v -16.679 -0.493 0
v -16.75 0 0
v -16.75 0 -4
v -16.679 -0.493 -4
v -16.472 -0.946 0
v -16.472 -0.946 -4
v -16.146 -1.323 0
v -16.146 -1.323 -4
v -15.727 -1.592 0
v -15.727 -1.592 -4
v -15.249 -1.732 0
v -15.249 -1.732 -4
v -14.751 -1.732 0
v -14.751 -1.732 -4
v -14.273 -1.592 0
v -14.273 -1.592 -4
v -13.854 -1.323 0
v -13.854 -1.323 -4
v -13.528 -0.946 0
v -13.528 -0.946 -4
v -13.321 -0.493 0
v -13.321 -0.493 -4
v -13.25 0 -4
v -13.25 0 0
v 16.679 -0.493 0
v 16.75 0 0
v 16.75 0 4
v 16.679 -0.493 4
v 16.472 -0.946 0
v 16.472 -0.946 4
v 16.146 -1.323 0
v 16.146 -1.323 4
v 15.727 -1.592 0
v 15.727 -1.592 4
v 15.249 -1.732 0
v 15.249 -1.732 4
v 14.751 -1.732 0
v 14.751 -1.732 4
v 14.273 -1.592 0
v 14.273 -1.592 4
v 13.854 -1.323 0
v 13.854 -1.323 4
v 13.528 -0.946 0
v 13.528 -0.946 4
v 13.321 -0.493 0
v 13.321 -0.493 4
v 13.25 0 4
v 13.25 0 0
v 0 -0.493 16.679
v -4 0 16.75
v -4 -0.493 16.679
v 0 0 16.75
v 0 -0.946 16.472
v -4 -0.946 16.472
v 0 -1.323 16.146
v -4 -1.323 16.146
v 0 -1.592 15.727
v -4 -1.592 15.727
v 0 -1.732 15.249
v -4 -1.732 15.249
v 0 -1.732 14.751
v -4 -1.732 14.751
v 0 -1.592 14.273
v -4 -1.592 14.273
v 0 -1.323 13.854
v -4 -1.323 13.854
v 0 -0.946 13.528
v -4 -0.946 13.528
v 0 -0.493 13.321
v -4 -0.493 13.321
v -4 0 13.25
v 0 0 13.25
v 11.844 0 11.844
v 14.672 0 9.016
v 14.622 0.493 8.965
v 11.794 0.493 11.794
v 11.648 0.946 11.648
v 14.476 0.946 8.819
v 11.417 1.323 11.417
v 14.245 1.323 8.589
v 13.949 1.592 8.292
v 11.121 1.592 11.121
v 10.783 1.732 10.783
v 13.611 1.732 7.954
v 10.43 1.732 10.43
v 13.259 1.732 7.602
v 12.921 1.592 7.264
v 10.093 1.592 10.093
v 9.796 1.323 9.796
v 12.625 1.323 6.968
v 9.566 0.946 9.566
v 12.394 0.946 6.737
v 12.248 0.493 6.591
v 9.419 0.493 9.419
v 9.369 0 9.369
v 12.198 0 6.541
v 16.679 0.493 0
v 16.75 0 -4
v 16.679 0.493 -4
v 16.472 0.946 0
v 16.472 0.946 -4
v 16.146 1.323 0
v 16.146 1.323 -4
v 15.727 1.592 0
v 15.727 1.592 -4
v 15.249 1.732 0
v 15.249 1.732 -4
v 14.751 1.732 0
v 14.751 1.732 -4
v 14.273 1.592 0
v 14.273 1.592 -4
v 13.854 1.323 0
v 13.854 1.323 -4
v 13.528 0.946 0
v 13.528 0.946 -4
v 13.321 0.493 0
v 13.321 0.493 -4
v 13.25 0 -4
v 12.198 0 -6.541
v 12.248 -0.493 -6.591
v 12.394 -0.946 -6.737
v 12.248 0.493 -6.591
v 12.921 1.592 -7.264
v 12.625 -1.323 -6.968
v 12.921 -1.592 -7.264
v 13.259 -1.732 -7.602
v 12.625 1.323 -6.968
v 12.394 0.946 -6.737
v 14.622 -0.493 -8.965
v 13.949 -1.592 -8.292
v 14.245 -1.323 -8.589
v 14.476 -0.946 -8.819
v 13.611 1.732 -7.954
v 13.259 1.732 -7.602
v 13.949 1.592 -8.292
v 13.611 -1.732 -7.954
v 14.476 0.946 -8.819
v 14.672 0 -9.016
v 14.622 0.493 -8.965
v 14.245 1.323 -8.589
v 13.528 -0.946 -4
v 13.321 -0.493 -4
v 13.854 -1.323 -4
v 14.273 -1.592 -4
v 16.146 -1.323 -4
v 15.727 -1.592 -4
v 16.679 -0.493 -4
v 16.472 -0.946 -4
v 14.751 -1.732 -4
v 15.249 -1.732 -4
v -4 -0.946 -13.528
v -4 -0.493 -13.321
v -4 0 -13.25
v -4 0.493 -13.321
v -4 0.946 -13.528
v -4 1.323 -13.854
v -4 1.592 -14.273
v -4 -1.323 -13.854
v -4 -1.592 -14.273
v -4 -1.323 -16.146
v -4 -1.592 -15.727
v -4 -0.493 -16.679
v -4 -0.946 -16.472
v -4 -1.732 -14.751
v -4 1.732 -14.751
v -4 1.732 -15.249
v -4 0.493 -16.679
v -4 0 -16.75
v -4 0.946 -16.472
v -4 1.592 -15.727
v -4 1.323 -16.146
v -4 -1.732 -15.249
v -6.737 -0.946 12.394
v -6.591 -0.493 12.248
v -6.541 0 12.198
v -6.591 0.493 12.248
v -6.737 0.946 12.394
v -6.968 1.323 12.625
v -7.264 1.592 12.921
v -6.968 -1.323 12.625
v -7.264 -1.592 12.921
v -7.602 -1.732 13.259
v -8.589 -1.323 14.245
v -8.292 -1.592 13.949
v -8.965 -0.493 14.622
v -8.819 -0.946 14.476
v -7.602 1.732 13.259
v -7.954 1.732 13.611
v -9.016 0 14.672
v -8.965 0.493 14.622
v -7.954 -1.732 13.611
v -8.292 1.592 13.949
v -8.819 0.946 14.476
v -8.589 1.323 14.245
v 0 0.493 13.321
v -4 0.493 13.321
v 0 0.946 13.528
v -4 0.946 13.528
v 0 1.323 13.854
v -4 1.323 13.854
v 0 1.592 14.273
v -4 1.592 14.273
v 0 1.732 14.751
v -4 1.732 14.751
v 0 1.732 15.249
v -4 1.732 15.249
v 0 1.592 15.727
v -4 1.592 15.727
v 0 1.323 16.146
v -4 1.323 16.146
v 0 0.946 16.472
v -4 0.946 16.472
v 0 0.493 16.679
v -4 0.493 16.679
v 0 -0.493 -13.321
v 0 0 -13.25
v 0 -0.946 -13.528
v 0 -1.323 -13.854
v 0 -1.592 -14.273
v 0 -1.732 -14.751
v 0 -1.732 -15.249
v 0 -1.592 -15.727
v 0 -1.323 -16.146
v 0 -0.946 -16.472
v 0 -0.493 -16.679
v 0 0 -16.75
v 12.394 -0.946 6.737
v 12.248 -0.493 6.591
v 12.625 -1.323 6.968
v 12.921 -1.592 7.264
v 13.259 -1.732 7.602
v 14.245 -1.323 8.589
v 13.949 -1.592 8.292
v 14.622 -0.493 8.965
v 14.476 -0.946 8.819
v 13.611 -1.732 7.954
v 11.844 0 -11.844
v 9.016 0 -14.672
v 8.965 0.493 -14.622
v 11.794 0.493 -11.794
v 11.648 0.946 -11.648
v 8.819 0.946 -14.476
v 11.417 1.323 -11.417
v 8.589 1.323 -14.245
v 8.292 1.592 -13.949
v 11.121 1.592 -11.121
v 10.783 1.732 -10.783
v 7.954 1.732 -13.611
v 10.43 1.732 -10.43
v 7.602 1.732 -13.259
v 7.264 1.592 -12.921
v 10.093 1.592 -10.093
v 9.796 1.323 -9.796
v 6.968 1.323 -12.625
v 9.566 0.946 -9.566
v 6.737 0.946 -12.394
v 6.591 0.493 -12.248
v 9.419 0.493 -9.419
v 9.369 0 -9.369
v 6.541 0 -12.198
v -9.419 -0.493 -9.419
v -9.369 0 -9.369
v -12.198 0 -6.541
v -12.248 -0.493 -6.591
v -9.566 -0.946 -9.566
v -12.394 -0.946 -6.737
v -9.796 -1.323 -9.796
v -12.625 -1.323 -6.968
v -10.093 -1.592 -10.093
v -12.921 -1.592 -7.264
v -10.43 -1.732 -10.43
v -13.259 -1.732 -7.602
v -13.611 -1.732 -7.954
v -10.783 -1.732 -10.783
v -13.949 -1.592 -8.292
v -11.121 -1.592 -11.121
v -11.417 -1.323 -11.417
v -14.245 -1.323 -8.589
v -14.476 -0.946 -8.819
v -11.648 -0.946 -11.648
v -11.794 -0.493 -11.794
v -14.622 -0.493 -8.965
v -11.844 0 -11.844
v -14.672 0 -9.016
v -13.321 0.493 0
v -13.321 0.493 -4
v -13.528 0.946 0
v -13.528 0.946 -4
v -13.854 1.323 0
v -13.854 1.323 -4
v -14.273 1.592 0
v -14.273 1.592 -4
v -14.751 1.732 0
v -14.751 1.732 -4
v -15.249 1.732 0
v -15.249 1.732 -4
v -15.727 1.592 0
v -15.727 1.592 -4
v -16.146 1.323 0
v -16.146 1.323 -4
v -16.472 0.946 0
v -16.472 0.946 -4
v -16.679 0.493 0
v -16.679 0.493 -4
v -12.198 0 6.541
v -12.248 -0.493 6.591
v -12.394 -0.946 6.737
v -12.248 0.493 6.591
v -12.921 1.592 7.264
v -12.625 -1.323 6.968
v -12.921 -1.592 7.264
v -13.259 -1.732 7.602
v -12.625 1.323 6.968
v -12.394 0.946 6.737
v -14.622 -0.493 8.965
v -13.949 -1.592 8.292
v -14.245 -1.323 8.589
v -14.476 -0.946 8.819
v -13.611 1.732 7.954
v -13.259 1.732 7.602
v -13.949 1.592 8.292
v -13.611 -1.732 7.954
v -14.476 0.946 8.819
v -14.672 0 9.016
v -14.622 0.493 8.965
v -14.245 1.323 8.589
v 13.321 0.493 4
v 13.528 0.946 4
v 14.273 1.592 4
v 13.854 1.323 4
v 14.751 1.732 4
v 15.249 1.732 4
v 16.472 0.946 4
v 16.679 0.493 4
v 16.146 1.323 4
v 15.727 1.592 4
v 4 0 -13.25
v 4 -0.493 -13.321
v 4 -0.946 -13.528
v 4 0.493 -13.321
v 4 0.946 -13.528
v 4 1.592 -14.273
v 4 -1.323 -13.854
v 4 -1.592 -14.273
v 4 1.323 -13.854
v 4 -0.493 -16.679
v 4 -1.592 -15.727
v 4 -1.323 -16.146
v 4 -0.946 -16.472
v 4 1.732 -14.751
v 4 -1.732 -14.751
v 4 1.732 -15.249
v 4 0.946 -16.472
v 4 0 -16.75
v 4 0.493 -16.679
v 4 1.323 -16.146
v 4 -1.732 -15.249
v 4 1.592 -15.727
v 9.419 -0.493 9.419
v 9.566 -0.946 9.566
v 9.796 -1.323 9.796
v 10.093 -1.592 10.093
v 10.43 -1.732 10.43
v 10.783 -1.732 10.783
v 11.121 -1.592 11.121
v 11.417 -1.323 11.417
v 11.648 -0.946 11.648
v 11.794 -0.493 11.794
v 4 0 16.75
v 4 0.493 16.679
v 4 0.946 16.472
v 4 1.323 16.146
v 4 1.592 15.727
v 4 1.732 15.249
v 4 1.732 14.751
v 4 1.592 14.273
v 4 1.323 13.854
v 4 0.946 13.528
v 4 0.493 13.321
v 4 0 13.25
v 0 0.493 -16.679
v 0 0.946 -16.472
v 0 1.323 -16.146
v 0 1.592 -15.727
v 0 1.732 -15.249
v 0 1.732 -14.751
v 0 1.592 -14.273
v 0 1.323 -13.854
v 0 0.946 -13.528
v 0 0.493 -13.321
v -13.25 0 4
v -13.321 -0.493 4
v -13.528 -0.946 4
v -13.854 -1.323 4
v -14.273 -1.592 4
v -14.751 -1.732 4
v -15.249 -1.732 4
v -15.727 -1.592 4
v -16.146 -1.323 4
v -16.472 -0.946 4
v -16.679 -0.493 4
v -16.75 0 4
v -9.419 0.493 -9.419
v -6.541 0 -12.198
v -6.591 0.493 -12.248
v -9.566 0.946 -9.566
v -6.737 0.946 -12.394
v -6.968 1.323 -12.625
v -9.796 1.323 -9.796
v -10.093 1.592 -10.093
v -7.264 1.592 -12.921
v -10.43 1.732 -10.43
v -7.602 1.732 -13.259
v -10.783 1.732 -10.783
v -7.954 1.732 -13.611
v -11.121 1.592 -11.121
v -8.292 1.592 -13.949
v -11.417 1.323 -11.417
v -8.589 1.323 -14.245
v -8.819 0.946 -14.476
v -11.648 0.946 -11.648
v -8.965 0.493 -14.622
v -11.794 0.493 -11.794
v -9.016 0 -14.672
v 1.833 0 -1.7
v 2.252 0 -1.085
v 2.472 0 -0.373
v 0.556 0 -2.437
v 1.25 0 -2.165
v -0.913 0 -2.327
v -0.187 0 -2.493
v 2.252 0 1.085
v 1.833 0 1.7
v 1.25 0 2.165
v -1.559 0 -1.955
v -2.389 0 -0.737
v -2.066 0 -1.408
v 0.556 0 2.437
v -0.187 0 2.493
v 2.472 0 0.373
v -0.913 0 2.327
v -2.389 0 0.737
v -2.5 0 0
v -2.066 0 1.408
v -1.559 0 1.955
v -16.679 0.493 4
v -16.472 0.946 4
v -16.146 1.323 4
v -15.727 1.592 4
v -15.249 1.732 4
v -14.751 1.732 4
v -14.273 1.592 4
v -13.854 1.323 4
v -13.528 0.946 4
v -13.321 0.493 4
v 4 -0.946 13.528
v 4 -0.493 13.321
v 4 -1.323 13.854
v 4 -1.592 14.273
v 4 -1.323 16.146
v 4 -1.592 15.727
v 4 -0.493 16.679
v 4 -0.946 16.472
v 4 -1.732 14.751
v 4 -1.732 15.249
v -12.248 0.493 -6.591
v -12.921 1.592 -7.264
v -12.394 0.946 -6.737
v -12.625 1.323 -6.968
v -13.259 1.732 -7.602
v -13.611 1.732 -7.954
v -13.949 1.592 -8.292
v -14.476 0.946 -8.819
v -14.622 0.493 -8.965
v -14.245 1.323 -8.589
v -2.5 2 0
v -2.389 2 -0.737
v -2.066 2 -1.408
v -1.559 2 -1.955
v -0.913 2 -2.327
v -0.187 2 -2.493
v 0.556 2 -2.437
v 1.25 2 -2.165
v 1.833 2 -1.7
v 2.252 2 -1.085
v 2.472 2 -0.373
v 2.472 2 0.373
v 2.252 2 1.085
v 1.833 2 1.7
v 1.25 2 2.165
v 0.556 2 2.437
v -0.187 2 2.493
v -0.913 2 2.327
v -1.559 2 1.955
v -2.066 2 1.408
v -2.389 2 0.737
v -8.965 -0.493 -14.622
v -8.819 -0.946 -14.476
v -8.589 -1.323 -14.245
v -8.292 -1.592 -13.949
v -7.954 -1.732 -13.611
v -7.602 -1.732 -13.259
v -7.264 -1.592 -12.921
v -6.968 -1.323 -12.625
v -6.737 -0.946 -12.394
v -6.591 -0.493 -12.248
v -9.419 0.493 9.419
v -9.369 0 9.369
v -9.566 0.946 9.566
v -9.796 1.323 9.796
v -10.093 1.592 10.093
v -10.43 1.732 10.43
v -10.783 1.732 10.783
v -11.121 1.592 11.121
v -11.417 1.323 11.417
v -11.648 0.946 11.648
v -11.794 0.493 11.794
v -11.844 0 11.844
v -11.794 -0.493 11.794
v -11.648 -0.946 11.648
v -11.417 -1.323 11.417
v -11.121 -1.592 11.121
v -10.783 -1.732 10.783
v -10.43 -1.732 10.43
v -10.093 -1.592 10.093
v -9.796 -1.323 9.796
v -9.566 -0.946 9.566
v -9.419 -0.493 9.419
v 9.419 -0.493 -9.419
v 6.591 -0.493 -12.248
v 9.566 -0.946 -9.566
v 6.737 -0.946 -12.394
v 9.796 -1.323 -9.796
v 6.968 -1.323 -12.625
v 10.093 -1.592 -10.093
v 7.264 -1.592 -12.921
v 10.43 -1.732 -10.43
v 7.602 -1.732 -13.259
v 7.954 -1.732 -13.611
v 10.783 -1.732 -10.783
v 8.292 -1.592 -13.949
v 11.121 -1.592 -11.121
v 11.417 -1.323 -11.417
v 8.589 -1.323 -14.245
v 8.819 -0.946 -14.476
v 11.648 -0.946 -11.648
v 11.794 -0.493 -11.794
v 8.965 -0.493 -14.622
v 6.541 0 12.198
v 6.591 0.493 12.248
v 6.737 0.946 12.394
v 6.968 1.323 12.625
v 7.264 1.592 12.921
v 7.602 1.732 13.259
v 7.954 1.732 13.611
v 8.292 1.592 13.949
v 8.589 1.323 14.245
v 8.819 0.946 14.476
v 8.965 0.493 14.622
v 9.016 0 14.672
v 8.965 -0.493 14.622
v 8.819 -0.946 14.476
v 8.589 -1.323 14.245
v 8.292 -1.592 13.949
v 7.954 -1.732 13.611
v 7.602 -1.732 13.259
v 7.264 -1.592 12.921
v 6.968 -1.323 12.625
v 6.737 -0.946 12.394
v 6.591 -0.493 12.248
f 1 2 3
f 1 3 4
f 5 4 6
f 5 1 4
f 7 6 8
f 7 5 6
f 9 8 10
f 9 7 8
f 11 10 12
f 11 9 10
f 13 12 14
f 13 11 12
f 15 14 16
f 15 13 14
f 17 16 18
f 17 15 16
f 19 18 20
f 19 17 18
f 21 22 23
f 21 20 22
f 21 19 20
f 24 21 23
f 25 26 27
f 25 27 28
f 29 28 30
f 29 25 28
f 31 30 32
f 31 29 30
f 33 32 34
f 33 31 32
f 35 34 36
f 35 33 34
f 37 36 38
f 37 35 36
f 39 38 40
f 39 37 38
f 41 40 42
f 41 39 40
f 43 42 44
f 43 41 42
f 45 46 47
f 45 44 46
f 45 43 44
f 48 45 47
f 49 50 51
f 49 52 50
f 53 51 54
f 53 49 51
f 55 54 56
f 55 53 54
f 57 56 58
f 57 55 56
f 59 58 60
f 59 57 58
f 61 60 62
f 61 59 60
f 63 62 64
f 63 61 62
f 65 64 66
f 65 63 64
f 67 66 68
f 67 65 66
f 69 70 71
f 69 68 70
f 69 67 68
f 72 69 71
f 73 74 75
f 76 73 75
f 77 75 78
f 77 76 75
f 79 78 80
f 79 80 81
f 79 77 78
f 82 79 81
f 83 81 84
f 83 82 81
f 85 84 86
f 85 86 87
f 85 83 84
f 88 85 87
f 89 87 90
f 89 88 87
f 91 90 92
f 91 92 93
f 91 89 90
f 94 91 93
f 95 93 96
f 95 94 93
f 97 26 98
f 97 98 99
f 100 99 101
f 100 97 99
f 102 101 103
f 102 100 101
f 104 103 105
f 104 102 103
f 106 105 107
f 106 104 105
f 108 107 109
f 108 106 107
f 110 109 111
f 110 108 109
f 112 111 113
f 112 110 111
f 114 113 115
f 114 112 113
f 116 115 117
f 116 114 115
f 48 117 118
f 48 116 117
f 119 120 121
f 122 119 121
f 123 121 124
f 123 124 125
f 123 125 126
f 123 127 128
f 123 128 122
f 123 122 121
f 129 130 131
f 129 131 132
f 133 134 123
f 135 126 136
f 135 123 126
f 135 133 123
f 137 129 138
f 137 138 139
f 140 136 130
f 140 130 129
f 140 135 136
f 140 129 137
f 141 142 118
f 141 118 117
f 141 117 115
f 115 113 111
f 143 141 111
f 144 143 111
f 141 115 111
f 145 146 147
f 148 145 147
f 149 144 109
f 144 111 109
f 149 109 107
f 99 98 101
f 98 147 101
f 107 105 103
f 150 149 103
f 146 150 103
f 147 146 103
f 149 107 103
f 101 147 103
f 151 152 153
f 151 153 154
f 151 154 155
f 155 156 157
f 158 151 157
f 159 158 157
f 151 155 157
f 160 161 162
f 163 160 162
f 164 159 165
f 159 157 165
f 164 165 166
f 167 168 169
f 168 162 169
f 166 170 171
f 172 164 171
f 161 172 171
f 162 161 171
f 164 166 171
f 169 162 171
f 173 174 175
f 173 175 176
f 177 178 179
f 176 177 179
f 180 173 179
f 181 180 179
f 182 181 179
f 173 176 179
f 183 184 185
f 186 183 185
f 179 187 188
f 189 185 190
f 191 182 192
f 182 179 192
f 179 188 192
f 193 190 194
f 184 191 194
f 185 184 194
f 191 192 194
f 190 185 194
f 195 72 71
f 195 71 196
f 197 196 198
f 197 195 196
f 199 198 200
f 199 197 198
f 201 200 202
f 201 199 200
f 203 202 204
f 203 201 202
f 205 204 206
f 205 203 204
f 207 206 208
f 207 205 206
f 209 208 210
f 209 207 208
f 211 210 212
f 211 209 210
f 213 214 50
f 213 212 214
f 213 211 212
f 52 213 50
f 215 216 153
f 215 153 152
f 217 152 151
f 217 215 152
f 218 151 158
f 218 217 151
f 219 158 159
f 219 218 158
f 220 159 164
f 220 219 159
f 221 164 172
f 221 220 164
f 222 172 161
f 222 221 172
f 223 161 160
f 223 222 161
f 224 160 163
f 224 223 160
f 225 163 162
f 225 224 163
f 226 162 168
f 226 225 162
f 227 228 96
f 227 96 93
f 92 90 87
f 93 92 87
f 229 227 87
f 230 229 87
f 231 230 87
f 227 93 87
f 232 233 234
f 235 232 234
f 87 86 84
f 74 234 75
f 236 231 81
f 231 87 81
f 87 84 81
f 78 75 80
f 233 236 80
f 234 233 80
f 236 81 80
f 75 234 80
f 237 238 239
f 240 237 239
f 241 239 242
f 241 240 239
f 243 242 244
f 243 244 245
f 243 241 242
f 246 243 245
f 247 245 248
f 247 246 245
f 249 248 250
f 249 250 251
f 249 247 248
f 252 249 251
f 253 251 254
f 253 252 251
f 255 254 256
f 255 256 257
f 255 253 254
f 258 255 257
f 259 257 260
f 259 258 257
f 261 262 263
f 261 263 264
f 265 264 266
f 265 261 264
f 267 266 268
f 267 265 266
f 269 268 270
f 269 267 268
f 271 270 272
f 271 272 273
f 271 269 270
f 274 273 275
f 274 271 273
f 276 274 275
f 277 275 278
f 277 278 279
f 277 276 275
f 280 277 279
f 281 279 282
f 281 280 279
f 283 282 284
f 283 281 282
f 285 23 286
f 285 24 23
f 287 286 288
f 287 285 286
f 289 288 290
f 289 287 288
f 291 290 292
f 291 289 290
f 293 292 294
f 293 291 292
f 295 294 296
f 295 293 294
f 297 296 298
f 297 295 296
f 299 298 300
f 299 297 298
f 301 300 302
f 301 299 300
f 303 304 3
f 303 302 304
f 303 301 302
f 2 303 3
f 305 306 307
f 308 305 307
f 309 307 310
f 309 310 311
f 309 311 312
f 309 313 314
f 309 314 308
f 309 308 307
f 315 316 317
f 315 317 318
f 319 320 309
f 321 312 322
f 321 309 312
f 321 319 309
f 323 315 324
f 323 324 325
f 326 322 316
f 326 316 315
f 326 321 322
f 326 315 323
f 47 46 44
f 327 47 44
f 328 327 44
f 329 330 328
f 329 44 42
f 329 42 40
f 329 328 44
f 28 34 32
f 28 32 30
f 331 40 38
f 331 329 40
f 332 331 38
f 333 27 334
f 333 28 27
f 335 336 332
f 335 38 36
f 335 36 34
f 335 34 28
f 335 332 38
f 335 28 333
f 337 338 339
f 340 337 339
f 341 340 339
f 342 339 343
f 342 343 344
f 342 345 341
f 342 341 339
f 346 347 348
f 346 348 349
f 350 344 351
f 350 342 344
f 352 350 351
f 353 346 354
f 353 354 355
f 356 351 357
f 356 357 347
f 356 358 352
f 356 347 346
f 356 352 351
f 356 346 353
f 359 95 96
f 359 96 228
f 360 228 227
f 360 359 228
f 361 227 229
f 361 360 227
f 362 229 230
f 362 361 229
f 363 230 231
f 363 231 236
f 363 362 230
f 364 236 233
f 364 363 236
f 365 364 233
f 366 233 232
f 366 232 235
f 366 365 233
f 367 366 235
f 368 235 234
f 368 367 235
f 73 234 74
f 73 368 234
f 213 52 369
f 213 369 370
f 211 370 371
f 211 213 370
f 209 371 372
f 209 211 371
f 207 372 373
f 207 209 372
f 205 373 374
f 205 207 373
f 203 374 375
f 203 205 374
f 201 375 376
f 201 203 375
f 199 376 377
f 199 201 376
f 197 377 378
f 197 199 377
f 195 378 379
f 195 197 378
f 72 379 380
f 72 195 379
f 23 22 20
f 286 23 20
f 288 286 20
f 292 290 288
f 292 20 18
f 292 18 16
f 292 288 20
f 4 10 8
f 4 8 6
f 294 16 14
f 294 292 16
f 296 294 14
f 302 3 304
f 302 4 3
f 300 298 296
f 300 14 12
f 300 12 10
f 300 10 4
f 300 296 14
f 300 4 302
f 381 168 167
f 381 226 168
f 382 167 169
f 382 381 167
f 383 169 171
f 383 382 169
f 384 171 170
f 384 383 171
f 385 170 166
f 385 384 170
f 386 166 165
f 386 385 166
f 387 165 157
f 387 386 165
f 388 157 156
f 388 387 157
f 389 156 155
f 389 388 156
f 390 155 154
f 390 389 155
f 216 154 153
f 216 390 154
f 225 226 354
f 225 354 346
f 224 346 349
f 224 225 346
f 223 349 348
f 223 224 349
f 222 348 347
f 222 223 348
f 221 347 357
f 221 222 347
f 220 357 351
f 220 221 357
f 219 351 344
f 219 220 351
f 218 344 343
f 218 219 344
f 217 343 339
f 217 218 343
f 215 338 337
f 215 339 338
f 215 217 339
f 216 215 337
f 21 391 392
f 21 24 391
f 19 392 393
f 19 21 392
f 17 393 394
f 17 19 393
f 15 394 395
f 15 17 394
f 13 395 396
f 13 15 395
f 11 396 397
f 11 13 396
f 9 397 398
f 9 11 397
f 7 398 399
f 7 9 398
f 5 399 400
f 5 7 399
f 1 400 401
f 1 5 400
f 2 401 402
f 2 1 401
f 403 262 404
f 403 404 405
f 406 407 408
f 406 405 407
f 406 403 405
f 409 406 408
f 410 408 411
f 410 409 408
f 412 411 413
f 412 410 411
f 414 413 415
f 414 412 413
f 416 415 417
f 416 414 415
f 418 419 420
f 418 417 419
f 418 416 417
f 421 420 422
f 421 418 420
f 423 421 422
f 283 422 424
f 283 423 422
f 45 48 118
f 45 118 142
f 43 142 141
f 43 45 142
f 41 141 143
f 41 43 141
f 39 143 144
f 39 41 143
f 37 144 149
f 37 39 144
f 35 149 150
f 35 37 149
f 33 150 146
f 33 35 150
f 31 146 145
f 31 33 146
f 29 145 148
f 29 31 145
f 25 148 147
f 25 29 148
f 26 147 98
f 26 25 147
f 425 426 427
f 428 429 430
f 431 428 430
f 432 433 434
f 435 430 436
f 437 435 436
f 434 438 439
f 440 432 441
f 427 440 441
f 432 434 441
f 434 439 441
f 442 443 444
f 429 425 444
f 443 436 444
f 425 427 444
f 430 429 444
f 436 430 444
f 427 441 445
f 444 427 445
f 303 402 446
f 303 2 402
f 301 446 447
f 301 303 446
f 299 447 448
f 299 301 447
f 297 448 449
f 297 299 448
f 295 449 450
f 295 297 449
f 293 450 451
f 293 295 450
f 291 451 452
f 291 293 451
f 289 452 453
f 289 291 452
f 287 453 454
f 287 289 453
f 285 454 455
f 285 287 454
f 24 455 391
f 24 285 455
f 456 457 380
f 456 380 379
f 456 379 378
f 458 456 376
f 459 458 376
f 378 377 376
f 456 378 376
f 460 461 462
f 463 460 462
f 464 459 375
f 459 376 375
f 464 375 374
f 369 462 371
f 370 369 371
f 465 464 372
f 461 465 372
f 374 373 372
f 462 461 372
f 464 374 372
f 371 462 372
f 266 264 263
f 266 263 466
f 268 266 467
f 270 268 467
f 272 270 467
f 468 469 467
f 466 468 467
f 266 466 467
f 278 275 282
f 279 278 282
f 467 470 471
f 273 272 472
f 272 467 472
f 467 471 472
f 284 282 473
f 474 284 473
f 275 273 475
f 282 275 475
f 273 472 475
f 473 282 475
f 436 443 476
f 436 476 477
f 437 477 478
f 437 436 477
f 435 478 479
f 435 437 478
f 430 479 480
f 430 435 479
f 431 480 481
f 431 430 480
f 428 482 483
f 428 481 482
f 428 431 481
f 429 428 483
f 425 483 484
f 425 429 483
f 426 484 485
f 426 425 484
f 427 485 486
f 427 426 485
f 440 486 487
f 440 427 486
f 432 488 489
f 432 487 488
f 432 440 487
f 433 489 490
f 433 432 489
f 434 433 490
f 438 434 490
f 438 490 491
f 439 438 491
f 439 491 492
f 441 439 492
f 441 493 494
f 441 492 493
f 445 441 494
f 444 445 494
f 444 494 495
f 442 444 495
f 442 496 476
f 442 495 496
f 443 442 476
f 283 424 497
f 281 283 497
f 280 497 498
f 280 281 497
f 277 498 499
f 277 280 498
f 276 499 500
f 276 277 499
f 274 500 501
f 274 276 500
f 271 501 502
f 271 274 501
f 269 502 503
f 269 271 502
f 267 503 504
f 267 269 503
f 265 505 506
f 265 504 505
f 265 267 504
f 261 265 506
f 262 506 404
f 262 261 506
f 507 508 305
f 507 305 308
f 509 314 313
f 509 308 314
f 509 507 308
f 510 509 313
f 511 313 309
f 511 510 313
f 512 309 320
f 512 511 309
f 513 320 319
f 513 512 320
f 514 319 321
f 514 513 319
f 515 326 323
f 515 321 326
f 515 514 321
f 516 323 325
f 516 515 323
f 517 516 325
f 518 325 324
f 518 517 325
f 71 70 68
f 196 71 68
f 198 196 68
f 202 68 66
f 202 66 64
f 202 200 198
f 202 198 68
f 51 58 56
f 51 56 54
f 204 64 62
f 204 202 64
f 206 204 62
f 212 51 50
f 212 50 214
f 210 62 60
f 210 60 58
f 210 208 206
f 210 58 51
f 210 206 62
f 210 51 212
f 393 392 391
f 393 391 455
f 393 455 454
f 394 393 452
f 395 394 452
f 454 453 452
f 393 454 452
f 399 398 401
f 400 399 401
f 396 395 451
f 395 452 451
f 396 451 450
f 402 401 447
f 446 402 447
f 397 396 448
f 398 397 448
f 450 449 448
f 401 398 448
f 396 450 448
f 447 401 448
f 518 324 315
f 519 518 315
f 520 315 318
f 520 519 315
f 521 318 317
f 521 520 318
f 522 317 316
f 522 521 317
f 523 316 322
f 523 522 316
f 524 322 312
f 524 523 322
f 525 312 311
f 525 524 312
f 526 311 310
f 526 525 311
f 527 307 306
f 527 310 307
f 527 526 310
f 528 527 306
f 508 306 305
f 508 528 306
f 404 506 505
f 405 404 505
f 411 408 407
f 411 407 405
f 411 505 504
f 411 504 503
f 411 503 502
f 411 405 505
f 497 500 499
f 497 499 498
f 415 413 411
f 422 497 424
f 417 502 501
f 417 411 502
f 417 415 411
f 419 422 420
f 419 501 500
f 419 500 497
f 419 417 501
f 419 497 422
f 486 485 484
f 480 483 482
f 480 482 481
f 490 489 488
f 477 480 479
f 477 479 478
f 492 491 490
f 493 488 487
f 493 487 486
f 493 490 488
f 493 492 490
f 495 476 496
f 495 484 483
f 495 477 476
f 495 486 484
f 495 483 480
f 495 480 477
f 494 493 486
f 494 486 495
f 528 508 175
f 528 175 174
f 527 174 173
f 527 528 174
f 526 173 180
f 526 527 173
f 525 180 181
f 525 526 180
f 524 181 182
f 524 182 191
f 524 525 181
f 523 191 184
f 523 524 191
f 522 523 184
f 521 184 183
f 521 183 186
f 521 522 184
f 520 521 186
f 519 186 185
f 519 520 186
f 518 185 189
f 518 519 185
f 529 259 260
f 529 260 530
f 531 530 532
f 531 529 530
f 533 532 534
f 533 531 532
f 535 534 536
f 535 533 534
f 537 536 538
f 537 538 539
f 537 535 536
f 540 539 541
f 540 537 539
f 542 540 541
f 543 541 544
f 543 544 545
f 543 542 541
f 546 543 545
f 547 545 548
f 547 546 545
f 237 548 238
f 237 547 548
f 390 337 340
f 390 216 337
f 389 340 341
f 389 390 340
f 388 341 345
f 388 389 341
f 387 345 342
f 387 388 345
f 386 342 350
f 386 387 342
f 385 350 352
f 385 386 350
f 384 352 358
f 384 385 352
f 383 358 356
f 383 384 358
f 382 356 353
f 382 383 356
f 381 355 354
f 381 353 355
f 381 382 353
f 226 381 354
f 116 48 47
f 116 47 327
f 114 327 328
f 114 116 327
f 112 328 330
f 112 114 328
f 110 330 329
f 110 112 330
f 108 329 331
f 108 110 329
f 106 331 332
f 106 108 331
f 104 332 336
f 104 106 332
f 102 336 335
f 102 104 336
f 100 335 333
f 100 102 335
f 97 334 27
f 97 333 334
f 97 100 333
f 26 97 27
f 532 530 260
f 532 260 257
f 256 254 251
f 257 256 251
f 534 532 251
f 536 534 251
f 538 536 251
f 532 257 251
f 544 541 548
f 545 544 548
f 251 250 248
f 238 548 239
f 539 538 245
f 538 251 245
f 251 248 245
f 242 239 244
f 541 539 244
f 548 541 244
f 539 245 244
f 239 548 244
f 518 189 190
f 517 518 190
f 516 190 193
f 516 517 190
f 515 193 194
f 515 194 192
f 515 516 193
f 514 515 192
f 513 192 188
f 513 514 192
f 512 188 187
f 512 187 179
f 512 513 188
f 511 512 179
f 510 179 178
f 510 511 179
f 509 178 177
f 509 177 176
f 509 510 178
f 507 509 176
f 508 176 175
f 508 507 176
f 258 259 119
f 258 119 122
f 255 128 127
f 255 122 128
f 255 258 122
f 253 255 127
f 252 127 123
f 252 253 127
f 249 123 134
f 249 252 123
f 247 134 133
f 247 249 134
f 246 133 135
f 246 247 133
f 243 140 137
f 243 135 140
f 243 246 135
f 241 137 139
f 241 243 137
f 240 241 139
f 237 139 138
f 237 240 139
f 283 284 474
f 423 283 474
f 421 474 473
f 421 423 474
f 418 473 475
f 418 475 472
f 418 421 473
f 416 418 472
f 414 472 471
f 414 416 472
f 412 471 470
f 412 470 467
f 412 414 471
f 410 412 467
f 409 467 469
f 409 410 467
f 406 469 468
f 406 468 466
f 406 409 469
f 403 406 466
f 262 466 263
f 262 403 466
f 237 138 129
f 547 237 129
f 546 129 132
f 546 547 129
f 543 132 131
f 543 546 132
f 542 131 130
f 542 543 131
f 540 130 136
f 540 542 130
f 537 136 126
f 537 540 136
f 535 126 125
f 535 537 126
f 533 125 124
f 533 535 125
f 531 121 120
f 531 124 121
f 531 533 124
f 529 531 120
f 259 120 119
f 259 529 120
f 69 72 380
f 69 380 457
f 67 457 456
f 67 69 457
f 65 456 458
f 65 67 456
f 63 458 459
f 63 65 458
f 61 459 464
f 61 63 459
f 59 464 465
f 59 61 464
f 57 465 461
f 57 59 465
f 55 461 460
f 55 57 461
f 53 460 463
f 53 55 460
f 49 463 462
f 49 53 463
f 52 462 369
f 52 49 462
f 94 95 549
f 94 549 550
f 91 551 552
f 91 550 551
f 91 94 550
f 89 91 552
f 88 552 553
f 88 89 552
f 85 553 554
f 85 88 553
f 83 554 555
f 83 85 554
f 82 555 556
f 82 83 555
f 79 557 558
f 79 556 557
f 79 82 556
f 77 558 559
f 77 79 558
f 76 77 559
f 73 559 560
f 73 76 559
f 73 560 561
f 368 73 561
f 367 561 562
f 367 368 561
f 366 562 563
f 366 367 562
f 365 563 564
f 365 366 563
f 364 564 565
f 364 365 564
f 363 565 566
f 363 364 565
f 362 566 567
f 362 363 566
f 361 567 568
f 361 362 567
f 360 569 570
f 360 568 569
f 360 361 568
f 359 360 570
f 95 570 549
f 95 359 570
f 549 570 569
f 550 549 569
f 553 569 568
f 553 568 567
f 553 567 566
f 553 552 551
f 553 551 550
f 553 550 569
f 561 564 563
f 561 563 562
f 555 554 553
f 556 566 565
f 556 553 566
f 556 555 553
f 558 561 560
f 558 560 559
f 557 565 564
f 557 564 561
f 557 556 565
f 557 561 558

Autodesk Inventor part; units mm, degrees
ref_plane "YZ Plane" through (0, 0, 0) normal (1, 0, 0) x (0, 1, 0)
ref_plane "XZ Plane" through (0, 0, 0) normal (0, 1, 0) x (-1, 0, 0)
ref_plane "XY Plane" through (0, 0, 0) normal (0, 0, 1) x (1, 0, 0)
sketch "Sketch4" plane through (0, 0, 0) normal (0, 0, 1) x (1, 0, 0)
  line L0 (0, 0) -> (15, 0)
  circle A0 centre (15, 0) radius 1.75
  dimension "d3" = 15
  dimension "d4" = 3.5
extrude "Extrusion1" add sketch "Sketch4" along normal mid plane 8
sketch "Sketch5" plane through (0, 0, 0) normal (0, 1, 0) x (-1, 0, 0)
  circle A0 centre (0, 0) radius 2.5
  dimension "d7" = 5
extrude "Extrusion2" add sketch "Sketch5" along normal blind 2
pattern_circular "Circular Pattern1" count 8 over 360 about axis through (0, 0, 0) along (0, 1, 0) of "Extrusion1"
properties part number "Ring"
